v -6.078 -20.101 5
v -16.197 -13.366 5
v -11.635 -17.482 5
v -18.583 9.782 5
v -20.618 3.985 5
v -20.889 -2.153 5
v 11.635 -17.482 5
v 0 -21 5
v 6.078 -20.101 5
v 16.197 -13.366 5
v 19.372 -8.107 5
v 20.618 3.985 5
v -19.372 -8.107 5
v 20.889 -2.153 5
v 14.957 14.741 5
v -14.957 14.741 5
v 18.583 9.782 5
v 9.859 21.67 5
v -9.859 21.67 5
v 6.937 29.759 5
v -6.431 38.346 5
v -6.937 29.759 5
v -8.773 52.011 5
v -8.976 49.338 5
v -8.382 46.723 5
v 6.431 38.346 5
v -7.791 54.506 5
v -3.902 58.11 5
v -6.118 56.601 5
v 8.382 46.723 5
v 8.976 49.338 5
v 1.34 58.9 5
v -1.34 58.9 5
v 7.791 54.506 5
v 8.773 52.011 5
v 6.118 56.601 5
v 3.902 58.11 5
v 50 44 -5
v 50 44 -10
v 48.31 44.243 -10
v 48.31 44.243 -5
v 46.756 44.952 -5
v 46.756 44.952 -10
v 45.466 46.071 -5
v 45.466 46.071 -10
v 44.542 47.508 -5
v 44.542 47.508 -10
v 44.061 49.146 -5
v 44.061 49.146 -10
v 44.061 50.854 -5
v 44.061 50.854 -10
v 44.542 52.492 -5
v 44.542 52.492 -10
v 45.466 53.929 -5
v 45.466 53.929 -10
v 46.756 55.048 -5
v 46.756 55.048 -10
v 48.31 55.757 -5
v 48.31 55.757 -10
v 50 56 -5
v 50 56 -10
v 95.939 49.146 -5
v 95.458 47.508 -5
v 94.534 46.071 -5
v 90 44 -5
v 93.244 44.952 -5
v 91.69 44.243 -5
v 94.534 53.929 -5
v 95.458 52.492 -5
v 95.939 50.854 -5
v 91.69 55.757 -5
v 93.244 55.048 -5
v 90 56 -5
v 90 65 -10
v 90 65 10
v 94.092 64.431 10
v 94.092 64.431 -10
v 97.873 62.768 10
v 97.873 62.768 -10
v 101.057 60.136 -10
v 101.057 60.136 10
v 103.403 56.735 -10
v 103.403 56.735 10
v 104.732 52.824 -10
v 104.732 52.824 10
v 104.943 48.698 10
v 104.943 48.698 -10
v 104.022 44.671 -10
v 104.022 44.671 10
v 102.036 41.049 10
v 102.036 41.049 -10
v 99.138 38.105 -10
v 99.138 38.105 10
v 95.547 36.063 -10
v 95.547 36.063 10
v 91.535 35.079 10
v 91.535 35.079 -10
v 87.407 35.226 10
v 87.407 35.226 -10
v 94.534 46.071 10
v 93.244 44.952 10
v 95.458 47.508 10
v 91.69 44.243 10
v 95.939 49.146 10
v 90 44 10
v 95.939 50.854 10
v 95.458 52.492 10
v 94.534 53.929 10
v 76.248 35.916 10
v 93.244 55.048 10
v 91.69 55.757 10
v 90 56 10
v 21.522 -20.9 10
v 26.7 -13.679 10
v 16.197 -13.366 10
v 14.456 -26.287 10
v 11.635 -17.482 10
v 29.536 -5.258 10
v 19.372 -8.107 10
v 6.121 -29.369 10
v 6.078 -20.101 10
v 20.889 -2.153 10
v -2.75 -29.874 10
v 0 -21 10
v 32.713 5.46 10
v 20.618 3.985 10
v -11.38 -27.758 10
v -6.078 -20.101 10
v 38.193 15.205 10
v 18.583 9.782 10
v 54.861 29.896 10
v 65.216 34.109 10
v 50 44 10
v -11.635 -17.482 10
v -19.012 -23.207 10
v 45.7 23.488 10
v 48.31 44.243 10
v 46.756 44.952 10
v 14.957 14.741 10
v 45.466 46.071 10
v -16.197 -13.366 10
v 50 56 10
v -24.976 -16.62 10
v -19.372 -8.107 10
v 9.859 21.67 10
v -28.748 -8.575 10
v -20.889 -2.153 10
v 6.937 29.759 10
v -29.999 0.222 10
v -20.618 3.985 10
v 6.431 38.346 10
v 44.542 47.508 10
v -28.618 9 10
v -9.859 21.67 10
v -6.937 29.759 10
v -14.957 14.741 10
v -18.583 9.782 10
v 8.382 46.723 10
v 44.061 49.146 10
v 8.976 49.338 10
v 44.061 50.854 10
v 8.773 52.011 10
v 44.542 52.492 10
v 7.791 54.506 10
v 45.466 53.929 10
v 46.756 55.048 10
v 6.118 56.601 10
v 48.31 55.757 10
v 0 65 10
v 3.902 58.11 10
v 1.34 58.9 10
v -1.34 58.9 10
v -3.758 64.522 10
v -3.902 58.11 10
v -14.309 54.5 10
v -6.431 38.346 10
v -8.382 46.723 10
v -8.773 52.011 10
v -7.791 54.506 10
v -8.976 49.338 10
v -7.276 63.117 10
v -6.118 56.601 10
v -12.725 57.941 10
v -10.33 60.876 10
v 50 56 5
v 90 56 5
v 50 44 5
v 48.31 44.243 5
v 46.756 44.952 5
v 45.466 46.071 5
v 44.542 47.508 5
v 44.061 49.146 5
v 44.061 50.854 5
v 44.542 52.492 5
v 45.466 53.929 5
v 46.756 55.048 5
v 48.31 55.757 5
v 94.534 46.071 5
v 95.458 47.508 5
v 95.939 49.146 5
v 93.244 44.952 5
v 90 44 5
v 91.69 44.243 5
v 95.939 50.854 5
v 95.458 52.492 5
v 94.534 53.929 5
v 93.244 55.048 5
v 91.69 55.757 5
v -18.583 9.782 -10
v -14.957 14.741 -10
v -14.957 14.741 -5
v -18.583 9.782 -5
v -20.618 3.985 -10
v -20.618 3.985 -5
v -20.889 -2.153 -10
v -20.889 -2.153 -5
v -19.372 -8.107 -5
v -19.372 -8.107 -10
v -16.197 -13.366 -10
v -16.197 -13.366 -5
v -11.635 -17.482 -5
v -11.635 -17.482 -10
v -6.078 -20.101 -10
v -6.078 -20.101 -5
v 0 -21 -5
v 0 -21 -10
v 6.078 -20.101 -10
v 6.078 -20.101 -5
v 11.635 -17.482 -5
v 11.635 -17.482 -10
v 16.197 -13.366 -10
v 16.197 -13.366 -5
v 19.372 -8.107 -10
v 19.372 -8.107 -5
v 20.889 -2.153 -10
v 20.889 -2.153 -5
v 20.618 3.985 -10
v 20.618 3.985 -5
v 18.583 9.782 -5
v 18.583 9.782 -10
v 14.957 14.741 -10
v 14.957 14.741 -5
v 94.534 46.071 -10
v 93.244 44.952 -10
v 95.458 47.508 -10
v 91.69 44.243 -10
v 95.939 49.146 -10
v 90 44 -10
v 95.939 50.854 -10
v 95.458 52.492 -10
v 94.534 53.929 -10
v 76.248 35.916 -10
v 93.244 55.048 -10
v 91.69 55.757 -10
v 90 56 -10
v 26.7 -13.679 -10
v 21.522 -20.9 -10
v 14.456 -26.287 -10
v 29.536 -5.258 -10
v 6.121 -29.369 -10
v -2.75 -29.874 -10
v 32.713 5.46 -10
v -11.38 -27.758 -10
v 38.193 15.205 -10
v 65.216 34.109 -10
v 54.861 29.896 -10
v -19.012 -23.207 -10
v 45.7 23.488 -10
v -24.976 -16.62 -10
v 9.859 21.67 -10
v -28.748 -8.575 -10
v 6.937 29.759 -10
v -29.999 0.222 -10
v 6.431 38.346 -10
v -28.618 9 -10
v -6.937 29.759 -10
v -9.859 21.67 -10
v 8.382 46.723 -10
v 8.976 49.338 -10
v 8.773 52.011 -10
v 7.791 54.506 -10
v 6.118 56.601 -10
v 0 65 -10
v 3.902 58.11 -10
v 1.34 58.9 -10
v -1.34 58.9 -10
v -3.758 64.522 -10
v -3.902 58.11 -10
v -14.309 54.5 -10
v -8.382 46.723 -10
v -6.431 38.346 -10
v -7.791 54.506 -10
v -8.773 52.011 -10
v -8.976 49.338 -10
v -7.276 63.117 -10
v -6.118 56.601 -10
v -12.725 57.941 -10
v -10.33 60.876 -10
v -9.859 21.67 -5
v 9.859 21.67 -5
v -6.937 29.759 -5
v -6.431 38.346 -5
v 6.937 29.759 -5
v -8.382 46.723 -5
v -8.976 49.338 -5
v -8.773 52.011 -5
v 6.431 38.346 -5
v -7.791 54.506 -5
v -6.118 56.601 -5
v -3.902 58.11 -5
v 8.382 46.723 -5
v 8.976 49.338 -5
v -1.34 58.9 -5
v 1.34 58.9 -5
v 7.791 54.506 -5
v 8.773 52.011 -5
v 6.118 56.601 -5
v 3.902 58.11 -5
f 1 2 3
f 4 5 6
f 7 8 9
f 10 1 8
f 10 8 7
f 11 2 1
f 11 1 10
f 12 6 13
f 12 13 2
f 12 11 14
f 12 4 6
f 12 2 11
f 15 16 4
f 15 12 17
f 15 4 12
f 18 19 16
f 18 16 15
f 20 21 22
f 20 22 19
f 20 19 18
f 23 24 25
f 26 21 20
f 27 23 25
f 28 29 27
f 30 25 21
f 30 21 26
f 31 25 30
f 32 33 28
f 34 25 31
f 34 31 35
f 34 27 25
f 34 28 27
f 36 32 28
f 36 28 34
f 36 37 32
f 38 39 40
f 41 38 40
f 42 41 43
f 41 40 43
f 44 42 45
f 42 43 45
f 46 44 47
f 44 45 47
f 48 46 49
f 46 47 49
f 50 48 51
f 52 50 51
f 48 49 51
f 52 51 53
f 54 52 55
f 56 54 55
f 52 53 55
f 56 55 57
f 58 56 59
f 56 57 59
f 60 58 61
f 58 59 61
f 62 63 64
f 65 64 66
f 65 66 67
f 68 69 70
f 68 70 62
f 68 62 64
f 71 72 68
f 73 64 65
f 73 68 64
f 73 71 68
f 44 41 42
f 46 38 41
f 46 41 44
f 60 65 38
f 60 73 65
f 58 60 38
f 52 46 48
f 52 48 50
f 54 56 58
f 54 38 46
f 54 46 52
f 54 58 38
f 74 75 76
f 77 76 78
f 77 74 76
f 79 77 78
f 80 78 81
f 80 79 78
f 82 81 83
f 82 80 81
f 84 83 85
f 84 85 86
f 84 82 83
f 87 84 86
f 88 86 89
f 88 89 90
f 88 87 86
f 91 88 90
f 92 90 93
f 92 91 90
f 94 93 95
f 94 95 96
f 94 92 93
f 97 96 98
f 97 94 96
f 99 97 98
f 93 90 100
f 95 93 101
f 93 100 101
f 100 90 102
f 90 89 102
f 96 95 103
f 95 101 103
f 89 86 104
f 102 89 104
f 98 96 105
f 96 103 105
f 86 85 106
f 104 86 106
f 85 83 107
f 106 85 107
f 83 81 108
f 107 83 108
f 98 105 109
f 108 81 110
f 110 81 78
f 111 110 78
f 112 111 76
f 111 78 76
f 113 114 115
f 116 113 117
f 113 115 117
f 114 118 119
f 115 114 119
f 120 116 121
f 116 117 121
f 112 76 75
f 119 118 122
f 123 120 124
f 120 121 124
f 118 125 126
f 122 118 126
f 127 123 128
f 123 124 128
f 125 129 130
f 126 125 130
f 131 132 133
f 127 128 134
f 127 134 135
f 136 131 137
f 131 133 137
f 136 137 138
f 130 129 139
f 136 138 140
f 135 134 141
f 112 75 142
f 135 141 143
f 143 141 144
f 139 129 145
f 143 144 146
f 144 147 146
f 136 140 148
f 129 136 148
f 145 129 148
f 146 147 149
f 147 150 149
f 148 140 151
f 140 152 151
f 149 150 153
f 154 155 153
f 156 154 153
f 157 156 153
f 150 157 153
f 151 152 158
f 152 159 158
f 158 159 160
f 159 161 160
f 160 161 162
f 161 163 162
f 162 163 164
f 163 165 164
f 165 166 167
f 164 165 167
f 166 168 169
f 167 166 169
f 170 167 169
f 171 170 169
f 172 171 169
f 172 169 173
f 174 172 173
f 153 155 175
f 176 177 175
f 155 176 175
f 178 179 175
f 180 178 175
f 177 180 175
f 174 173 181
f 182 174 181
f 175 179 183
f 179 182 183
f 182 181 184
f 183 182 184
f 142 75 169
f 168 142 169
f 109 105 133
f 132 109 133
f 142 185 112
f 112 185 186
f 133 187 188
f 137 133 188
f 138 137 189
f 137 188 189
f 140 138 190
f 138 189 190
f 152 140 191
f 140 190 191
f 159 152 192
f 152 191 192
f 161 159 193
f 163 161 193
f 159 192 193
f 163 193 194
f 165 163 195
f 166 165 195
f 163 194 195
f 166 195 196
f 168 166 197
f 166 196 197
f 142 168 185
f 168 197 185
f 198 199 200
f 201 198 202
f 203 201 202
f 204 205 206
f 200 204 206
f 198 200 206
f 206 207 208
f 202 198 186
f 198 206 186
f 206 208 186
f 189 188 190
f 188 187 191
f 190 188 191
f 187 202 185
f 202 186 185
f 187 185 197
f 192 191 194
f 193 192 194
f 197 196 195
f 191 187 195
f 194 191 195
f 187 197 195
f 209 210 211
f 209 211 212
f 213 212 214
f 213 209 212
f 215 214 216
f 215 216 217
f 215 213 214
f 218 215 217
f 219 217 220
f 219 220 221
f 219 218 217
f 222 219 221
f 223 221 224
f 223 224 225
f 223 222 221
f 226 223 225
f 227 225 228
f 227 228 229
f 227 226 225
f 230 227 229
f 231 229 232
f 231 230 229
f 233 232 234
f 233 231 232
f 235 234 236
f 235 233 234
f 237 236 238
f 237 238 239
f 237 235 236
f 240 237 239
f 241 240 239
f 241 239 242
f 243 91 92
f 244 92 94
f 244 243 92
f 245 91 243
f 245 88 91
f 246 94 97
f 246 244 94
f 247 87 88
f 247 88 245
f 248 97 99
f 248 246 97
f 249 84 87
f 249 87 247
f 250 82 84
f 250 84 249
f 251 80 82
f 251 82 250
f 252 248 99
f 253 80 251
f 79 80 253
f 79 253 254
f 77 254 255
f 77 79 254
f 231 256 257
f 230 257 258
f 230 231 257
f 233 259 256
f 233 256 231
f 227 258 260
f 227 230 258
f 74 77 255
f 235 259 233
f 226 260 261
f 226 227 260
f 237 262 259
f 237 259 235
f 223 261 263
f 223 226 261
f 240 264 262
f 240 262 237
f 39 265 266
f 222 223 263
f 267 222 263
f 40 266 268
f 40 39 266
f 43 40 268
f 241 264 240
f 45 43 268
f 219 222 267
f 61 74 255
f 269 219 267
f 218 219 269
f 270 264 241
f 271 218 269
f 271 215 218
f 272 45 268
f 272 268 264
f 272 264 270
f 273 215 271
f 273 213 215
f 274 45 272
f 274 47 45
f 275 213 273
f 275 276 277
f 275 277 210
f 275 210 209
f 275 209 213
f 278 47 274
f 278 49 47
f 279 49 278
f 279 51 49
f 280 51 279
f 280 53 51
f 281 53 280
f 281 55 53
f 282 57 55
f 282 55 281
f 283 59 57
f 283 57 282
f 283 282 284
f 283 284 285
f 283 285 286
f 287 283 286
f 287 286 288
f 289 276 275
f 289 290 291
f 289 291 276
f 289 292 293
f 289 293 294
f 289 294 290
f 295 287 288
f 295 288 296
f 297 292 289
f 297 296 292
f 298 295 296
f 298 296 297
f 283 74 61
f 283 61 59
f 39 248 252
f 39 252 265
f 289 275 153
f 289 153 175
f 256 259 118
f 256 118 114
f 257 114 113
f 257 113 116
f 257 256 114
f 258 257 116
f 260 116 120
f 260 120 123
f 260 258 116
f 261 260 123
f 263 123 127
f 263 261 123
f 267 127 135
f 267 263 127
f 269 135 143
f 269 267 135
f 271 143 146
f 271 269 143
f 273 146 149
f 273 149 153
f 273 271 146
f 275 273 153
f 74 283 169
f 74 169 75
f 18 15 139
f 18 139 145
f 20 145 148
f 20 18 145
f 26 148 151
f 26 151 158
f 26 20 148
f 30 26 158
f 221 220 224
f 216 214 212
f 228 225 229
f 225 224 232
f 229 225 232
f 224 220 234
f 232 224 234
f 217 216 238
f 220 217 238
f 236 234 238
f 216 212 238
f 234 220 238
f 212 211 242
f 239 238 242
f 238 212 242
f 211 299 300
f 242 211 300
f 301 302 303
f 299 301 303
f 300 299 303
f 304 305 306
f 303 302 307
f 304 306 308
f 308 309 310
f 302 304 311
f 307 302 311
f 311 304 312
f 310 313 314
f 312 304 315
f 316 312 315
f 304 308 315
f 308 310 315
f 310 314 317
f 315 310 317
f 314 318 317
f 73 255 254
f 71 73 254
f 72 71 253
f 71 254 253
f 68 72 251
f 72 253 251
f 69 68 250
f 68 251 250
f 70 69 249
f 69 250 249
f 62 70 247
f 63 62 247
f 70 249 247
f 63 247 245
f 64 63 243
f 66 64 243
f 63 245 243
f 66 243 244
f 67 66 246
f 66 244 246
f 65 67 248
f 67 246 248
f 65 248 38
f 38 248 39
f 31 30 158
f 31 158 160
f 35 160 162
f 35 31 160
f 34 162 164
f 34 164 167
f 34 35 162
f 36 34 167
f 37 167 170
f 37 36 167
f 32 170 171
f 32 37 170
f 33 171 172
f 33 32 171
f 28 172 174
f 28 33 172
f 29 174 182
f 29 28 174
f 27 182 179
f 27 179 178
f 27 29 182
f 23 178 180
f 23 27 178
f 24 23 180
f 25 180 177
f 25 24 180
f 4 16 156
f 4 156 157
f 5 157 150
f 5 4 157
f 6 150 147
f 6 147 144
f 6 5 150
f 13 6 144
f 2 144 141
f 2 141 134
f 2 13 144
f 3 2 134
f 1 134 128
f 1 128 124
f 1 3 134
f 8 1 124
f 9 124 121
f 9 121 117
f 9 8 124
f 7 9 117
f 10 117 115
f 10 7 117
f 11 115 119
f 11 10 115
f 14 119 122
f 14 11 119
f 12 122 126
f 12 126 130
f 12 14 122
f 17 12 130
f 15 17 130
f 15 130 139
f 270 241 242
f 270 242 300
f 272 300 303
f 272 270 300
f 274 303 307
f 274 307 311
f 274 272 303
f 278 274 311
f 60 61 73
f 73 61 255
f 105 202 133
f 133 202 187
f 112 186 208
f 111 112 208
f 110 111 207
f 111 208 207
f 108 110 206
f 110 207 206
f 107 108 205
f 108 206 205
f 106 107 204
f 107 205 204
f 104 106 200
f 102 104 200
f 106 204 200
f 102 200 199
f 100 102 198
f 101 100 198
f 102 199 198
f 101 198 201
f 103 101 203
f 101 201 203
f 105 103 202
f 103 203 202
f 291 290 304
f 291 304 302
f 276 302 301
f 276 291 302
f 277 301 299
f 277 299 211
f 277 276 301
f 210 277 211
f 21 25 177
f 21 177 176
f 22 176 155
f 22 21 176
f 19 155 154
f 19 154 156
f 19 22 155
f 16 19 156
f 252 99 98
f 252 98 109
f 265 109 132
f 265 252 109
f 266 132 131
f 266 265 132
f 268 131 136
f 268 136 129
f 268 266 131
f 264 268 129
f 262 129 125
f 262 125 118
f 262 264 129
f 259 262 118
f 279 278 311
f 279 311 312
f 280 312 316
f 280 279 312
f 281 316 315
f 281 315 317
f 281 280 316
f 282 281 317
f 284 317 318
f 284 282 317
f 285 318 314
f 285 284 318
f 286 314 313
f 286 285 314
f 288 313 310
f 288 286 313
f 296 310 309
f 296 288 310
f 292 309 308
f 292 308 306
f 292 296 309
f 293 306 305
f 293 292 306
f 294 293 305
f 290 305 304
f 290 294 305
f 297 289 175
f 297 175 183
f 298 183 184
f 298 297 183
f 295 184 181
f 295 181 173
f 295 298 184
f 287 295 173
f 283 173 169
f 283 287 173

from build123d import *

# Parameters (mm, degrees)
BOSS_EXTRUDE1_DEPTH   = 5
BOSS_EXTRUDE1_2_DEPTH = 5
BOSS_EXTRUDE2_START   = -10
BOSS_EXTRUDE2_DEPTH   = 20


with BuildPart() as part:
    # Sketch1 → Boss-Extrude1 (new, symmetric)
    with BuildSketch(Plane.XY):
        with BuildLine():
            Line((90, 44), (50, 44))
            ThreePointArc((50, 44), (44, 50), (50, 56))
            Line((50, 56), (90, 56))
            ThreePointArc((90, 56), (96, 50), (90, 44))
        make_face()
    extrude(amount=BOSS_EXTRUDE1_DEPTH, both=True)



with BuildPart() as body_2:
    # Sketch1 → Boss-Extrude1 2 (new, symmetric)
    with BuildSketch(Plane.XY):
        with BuildLine():
            ThreePointArc((-14.956527547, 14.741176471), (0, -21), (14.956527547, 14.741176471))
            ThreePointArc((14.956527547, 14.741176471), (6.937432482, 29.759413292), (8.382229724, 46.723076923))
            ThreePointArc((8.382229724, 46.723076923), (0, 59), (-8.382229724, 46.723076923))
            ThreePointArc((-8.382229724, 46.723076923), (-6.937432482, 29.759413292), (-14.956527547, 14.741176471))
        make_face()
    extrude(amount=BOSS_EXTRUDE1_2_DEPTH, both=True)


with BuildPart() as part_1:
    add(part.part)

    add(body_2.part)  # Boss-Extrude2 merges body 2
    # Sketch1<4> → Boss-Extrude2 (add)
    with BuildSketch(Plane.XY.offset(BOSS_EXTRUDE2_START)):
        with BuildLine():
            Line((0, 65), (90, 65))
            ThreePointArc((90, 65), (104.943418217, 48.698365648), (87.406551135, 35.225900265))
            ThreePointArc((87.406551135, 35.225900265), (50.100874494, 26.949083525), (29.535645594, -5.25791207))
            ThreePointArc((29.535645594, -5.25791207), (-7.143700144, -29.137047693), (-28.618176043, 9))
            Line((-28.618176043, 9), (-14.309088021, 54.5))
            ThreePointArc((-14.309088021, 54.5), (-8.874119675, 62.093386622), (0, 65))
        make_face()
        with BuildLine():
            Line((90, 44), (50, 44))
            ThreePointArc((50, 44), (44, 50), (50, 56))
            Line((50, 56), (90, 56))
            ThreePointArc((90, 56), (96, 50), (90, 44))
        make_face(mode=Mode.SUBTRACT)
        with BuildLine():
            ThreePointArc((-14.956527547, 14.741176471), (0, -21), (14.956527547, 14.741176471))
            ThreePointArc((14.956527547, 14.741176471), (6.937432482, 29.759413292), (8.382229724, 46.723076923))
            ThreePointArc((8.382229724, 46.723076923), (0, 59), (-8.382229724, 46.723076923))
            ThreePointArc((-8.382229724, 46.723076923), (-6.937432482, 29.759413292), (-14.956527547, 14.741176471))
        make_face(mode=Mode.SUBTRACT)
    extrude(amount=BOSS_EXTRUDE2_DEPTH)


solid = part_1.part
